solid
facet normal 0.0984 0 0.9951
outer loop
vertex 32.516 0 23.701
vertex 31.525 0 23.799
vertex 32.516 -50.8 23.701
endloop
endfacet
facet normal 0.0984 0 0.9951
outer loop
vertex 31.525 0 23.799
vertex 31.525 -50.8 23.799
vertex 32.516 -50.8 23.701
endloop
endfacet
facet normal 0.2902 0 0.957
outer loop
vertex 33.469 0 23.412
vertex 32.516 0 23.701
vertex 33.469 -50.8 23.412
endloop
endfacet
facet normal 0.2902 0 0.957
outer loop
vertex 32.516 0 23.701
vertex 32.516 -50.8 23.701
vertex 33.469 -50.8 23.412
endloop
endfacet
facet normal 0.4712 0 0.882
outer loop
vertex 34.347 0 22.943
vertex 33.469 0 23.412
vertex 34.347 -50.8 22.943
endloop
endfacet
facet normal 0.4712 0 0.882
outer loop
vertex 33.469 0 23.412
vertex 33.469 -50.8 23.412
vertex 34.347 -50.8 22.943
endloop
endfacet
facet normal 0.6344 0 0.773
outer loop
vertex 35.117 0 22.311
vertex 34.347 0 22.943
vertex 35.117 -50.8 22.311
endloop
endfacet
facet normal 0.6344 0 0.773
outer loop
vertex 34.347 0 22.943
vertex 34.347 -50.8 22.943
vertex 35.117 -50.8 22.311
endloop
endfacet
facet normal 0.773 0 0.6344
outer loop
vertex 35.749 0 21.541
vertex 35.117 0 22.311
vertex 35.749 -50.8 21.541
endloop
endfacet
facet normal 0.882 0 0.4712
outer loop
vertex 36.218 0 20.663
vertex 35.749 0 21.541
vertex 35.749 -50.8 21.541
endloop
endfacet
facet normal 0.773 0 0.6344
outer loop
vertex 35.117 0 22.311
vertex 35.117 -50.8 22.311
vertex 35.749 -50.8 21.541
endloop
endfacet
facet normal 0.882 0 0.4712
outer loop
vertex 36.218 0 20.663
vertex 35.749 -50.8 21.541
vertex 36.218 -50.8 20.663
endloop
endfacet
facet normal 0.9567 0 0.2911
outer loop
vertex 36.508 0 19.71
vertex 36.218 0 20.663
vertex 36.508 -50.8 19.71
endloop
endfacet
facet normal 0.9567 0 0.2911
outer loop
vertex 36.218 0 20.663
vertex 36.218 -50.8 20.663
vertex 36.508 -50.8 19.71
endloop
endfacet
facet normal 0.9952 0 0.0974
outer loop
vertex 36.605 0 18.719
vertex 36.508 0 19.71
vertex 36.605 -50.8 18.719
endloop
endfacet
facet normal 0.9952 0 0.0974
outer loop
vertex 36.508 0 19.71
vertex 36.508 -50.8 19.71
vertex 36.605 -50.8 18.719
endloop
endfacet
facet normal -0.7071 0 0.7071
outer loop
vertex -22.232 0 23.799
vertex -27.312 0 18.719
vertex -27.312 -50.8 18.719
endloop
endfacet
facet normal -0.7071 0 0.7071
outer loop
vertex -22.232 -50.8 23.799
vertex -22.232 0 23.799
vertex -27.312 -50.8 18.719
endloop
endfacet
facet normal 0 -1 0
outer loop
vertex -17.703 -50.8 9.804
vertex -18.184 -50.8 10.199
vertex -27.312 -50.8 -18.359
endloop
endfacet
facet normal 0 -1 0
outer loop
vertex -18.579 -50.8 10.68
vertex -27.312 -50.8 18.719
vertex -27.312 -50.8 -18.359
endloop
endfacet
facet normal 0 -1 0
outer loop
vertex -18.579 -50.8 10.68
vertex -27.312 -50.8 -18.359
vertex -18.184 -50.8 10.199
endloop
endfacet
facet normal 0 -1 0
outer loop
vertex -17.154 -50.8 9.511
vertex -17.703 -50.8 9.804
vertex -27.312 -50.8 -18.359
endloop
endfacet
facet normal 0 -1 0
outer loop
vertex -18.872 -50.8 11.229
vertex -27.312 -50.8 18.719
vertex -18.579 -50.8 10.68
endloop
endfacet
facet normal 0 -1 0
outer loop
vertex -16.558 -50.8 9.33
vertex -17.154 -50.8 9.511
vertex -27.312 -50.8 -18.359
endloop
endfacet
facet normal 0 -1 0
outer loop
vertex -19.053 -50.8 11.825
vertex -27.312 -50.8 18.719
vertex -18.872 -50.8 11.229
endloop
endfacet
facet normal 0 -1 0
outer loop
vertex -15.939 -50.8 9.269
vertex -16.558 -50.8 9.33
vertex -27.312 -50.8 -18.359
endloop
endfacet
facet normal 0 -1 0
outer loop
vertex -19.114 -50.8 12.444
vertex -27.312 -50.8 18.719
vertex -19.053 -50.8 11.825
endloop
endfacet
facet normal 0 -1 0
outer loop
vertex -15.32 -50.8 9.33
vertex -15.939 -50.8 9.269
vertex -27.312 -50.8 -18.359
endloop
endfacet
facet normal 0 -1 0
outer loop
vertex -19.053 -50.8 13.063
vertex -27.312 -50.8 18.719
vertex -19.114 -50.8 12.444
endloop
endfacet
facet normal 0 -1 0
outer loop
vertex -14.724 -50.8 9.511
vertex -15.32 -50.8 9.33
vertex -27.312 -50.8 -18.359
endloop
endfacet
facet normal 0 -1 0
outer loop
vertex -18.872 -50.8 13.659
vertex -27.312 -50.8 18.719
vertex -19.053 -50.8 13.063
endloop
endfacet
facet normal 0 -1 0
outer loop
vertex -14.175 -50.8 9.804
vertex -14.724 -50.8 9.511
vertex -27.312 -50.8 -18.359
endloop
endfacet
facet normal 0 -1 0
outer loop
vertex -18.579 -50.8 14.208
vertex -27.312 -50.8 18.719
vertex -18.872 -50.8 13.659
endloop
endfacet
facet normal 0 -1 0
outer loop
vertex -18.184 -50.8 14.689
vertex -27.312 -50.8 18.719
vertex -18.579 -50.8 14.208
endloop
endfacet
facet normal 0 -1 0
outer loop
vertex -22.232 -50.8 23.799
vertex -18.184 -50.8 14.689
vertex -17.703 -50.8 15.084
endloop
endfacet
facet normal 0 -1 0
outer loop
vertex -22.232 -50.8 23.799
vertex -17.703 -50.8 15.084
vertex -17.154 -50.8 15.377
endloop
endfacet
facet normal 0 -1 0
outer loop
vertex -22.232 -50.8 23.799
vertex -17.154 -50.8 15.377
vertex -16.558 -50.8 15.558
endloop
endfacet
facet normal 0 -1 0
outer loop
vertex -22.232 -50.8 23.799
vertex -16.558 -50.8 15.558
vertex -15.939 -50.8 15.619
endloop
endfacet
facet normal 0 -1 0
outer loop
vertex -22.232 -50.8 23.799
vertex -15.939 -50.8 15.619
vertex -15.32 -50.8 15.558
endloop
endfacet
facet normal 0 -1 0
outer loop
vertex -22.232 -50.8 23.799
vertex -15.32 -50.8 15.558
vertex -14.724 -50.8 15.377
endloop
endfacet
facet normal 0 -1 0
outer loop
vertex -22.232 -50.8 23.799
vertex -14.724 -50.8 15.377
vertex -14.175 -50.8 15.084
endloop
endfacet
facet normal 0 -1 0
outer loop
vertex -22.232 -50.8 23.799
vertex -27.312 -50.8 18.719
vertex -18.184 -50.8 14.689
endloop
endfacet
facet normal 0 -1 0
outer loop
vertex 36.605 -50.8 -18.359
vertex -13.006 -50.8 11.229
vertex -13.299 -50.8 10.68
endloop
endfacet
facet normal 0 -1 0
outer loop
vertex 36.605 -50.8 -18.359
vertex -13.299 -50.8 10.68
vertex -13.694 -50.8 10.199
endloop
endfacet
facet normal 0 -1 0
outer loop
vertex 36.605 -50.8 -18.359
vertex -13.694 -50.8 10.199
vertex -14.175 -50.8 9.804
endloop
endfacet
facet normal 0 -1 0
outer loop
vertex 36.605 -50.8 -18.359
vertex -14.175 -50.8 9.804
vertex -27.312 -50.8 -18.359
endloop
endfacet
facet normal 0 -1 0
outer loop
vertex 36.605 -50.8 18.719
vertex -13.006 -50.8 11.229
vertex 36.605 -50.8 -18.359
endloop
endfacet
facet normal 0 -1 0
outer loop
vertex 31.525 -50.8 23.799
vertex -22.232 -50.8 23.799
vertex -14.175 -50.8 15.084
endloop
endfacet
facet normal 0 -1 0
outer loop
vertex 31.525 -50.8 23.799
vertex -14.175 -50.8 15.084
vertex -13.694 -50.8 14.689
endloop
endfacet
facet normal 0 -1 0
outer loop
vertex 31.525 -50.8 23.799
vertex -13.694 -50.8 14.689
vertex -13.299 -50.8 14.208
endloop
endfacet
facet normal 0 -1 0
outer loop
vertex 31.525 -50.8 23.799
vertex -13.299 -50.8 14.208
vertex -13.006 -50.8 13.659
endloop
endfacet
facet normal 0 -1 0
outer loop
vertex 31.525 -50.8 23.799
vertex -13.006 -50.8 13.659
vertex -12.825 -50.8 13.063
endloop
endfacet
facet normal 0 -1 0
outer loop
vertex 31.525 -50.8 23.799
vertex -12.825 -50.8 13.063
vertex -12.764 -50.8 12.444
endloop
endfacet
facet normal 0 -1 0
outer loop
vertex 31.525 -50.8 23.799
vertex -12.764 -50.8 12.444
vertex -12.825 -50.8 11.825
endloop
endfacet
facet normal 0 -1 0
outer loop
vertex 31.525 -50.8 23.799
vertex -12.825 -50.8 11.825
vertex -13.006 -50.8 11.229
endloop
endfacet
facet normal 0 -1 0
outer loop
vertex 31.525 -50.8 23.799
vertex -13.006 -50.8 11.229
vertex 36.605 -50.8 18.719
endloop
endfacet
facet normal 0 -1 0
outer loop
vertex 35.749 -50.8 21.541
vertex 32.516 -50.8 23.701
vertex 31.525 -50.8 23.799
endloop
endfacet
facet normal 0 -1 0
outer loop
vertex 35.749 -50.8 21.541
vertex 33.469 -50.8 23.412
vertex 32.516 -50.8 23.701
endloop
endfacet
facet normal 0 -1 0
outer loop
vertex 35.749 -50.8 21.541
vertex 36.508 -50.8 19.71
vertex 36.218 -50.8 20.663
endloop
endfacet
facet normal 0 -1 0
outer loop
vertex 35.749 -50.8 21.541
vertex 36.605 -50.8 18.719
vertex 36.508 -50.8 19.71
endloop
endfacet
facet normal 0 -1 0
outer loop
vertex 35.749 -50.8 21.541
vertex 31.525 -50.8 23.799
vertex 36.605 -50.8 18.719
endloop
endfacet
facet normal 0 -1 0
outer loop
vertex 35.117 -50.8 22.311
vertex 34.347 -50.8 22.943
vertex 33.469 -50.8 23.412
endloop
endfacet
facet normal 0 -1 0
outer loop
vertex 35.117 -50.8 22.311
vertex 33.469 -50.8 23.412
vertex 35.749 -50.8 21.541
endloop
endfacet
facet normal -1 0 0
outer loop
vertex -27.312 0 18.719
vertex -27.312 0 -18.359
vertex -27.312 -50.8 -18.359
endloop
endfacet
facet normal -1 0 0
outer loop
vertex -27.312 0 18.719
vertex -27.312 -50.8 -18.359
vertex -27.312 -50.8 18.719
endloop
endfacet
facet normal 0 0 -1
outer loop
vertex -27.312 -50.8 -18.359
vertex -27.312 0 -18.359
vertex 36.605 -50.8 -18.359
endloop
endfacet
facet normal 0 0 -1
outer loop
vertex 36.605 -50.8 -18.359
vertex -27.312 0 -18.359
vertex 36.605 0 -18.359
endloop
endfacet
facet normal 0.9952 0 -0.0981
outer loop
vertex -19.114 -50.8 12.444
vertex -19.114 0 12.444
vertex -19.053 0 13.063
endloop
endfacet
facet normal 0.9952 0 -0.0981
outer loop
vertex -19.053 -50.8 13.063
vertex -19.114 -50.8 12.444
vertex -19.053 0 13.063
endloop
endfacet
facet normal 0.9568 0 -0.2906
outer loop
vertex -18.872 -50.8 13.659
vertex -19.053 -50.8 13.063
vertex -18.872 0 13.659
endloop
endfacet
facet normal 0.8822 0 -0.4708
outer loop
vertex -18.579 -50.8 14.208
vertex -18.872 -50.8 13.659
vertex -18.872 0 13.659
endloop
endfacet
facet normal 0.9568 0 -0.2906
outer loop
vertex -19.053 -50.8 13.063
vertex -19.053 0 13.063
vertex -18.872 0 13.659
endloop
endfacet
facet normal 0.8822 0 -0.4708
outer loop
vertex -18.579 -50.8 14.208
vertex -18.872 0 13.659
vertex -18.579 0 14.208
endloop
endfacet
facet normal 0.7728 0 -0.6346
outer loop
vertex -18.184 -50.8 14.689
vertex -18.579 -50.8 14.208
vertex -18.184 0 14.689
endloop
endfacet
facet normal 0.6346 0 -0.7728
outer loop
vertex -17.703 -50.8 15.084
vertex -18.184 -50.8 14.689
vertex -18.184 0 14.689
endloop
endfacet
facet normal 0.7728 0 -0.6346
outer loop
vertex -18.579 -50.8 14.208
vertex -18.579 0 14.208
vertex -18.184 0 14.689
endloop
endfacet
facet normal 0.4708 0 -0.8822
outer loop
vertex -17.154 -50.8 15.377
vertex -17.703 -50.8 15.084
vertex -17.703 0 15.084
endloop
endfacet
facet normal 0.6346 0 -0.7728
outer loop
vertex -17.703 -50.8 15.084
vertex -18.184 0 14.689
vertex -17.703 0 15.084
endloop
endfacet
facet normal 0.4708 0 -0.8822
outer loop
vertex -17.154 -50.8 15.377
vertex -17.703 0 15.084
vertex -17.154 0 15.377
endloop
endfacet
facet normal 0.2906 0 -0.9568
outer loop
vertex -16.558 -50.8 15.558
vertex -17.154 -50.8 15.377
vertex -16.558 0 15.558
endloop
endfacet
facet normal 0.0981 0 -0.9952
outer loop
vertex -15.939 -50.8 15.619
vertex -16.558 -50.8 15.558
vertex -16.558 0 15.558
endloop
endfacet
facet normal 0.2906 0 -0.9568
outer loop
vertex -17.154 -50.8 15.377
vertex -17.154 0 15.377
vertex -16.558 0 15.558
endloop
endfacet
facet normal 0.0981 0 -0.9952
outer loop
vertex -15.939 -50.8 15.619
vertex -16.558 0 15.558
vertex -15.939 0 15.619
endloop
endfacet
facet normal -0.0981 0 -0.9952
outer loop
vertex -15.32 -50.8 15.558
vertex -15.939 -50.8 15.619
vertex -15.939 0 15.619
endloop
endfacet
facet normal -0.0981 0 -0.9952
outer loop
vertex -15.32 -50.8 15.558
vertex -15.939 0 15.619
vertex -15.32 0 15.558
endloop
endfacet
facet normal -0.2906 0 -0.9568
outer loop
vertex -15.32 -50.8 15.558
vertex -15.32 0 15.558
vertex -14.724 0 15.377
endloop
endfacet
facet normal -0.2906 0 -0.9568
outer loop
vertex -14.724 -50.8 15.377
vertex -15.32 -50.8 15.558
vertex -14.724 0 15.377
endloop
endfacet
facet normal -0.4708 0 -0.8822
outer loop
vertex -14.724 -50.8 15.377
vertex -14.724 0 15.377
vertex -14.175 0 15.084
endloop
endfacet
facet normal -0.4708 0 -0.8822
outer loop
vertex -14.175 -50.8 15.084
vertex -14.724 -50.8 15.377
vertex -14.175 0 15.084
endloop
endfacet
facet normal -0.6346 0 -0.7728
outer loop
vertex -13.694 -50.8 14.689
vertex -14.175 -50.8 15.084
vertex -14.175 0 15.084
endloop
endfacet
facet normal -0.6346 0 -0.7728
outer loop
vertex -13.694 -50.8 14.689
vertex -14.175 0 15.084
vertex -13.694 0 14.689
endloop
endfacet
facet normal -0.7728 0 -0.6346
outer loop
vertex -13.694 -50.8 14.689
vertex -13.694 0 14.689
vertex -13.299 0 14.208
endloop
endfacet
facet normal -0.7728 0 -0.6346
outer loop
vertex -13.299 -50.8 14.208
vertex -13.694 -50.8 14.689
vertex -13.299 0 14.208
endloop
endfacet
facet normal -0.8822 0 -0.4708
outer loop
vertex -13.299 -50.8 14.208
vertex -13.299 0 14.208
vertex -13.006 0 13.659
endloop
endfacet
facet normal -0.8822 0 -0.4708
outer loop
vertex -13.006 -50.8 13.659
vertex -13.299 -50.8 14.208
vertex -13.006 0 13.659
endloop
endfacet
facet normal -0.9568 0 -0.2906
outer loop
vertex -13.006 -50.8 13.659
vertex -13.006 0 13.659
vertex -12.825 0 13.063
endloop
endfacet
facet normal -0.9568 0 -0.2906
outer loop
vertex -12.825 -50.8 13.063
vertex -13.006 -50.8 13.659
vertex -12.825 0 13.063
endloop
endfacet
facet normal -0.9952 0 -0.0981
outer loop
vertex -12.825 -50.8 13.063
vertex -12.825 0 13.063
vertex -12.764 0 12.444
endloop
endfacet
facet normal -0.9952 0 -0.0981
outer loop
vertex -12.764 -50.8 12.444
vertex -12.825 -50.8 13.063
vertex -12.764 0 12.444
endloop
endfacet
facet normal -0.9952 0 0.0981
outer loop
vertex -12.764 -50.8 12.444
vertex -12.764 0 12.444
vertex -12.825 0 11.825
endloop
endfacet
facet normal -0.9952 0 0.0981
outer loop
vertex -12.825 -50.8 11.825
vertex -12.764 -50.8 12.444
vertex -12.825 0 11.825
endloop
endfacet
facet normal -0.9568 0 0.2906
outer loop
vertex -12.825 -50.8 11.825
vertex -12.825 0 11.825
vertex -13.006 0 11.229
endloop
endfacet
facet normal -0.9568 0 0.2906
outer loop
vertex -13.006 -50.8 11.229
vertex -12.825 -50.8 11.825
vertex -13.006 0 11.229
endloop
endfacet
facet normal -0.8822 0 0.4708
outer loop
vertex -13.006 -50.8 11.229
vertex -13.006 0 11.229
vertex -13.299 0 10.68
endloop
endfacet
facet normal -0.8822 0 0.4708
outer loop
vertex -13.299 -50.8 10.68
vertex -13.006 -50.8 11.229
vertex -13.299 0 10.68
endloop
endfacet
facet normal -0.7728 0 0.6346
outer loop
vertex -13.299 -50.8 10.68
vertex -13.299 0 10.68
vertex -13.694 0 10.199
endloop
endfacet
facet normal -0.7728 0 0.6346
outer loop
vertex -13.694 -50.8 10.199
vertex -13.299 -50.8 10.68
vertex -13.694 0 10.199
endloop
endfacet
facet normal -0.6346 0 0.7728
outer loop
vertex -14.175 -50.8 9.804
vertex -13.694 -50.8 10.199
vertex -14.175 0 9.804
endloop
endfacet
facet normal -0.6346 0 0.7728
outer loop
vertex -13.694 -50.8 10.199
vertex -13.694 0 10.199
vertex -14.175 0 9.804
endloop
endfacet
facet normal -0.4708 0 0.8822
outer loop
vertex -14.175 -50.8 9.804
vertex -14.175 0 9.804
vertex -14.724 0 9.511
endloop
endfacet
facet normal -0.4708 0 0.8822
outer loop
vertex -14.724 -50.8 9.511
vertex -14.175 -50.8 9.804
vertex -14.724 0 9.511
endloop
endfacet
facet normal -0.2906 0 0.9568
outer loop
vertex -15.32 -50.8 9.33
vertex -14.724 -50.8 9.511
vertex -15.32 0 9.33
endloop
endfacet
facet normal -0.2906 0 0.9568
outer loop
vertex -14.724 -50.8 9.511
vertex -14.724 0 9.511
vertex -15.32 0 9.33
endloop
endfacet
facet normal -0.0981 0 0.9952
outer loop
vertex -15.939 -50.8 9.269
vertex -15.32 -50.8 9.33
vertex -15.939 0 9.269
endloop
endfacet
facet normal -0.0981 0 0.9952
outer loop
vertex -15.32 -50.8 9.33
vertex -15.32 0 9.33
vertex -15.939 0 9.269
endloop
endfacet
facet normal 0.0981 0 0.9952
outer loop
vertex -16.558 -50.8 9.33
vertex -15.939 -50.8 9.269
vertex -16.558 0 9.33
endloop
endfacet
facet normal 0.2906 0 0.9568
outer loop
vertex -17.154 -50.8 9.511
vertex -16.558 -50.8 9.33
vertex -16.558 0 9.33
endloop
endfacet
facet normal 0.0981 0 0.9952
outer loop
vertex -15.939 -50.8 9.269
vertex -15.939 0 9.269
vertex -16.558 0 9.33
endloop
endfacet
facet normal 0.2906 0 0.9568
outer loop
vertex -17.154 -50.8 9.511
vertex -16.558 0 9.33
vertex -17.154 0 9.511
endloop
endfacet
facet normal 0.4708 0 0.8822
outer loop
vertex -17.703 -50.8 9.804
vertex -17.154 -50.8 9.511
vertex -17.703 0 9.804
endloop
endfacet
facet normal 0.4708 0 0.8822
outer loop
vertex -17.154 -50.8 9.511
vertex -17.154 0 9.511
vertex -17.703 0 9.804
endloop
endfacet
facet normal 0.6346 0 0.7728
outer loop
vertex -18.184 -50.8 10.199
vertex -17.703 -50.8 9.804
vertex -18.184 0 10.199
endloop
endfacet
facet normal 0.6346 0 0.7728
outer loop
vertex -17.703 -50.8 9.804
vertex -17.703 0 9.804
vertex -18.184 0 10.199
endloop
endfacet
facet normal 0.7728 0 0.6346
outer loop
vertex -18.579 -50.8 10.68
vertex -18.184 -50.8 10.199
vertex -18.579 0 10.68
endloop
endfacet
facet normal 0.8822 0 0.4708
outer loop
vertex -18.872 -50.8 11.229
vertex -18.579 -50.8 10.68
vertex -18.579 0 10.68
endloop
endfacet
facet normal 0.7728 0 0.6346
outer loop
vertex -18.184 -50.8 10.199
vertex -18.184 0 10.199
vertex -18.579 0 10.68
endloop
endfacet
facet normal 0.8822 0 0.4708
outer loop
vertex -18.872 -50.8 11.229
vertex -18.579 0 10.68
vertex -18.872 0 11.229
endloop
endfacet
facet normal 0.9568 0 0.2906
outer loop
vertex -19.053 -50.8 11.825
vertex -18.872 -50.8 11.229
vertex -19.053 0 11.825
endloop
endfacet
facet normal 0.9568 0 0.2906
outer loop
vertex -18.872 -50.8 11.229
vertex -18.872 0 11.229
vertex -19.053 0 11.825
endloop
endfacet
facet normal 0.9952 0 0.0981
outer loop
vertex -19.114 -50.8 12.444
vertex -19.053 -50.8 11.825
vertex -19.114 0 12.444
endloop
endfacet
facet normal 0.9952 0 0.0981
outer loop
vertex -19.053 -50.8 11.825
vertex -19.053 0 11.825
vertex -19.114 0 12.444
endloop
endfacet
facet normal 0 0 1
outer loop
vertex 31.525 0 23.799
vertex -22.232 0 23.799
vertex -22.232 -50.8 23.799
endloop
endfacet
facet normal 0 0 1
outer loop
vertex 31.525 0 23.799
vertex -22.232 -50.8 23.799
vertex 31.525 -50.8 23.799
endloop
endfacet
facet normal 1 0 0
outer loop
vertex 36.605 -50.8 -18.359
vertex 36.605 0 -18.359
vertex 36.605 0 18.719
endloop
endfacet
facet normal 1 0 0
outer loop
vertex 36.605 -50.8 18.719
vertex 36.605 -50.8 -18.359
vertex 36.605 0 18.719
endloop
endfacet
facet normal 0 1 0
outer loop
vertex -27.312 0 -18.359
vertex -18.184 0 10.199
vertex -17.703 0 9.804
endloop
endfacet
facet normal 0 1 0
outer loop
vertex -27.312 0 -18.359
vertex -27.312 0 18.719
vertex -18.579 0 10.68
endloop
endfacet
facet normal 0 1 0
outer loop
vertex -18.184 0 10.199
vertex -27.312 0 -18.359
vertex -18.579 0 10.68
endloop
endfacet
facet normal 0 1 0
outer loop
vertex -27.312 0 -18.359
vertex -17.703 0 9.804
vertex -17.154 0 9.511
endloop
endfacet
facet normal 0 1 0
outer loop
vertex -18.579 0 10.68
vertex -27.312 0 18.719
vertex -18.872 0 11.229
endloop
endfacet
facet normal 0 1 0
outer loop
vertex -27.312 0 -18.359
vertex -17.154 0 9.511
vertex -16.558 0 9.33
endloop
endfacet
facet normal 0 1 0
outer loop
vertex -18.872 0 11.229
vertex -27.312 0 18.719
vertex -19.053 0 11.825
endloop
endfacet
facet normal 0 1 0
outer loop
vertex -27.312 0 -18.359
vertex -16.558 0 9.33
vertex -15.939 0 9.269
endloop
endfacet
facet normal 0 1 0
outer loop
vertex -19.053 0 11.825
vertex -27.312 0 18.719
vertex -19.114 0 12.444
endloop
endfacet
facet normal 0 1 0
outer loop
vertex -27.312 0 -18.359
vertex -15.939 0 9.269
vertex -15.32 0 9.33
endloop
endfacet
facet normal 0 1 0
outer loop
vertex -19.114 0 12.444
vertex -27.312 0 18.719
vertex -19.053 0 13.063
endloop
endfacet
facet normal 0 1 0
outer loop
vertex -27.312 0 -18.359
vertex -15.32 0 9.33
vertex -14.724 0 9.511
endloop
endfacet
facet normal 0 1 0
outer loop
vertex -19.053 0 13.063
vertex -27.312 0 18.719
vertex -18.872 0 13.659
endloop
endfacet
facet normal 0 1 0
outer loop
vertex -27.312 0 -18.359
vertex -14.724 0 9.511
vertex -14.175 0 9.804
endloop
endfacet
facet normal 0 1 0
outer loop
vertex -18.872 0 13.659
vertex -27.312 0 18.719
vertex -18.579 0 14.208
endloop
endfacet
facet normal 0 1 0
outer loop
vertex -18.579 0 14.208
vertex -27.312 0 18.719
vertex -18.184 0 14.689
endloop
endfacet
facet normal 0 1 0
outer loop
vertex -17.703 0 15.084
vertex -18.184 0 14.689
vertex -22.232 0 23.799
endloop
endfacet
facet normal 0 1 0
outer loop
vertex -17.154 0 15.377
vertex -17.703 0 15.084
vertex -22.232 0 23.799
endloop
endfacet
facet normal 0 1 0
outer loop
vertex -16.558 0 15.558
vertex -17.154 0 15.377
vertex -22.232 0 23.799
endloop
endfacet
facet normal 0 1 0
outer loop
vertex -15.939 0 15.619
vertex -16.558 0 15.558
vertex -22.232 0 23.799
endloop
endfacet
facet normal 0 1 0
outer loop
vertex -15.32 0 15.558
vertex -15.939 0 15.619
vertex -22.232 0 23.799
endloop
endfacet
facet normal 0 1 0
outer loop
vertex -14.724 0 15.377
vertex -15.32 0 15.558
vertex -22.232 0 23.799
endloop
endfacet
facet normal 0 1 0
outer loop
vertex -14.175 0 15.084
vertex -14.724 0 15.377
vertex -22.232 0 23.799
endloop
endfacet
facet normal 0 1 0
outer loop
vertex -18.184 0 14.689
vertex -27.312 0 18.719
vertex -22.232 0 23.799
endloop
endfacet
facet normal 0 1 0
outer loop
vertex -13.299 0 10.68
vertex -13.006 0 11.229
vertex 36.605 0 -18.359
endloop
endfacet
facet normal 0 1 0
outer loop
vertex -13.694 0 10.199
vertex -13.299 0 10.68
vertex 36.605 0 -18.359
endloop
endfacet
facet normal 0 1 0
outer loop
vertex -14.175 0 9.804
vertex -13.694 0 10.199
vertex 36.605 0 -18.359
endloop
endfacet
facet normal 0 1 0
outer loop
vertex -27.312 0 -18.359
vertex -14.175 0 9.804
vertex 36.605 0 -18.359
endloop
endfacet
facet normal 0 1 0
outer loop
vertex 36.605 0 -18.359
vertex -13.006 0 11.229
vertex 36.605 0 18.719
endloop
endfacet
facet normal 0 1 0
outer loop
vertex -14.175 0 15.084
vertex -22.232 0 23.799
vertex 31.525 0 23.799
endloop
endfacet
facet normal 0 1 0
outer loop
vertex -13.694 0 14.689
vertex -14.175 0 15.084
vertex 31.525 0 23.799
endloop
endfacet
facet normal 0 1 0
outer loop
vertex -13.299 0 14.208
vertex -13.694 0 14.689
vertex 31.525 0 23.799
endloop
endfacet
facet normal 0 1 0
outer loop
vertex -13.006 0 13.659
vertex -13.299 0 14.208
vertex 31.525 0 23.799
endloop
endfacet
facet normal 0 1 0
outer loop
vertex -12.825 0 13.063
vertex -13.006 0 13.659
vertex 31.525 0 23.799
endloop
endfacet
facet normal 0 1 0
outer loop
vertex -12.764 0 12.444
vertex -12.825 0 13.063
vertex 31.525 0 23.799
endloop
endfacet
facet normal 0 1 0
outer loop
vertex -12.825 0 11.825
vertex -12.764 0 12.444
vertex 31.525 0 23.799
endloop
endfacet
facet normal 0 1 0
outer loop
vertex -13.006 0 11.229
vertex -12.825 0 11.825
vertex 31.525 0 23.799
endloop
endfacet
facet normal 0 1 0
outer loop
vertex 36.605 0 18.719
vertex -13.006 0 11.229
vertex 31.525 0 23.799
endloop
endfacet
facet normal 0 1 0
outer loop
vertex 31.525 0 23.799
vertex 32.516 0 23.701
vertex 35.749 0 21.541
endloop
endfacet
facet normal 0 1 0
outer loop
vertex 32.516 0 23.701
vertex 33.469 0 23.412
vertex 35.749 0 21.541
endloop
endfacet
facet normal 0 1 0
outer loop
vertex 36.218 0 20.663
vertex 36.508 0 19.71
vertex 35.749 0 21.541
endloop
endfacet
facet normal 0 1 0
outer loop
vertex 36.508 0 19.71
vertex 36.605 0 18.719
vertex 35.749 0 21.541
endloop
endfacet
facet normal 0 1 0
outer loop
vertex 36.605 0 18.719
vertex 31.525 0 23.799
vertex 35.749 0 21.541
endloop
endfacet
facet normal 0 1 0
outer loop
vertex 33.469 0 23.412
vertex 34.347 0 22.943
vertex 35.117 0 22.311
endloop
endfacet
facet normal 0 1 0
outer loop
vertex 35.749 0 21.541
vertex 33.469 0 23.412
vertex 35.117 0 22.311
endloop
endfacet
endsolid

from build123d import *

# Parameters (mm, degrees)
F0_W     = 63.917339
F0_H     = 42.158244
F1_DEPTH = 50.8
F3_D     = 6.35
F4_R     = 5.08
F5_SIZE  = 5.08


with BuildPart() as f1:
    # F0 (on Front) → F1 (new body)
    with BuildSketch(Plane.XZ):
        with Locations((4.646473, 2.719886)):
            Rectangle(F0_W, F0_H)
    extrude(amount=F1_DEPTH)

    # F3 (through all)
    with Locations(Plane.XZ.offset(50.8)):
        with Locations((-15.938915, 12.444086)):
            Hole(F3_D / 2)

    # F4
    f4_edges = [f1.edges().sort_by_distance(p)[0] for p in [
        (36.605142, -25.4, 23.799008),
    ]]
    fillet(f4_edges, radius=F4_R)

    # F5
    f5_edges = [f1.edges().sort_by_distance(p)[0] for p in [
        (-27.312197, -25.4, 23.799008),
    ]]
    chamfer(f5_edges, length=F5_SIZE)


solid = f1.part
